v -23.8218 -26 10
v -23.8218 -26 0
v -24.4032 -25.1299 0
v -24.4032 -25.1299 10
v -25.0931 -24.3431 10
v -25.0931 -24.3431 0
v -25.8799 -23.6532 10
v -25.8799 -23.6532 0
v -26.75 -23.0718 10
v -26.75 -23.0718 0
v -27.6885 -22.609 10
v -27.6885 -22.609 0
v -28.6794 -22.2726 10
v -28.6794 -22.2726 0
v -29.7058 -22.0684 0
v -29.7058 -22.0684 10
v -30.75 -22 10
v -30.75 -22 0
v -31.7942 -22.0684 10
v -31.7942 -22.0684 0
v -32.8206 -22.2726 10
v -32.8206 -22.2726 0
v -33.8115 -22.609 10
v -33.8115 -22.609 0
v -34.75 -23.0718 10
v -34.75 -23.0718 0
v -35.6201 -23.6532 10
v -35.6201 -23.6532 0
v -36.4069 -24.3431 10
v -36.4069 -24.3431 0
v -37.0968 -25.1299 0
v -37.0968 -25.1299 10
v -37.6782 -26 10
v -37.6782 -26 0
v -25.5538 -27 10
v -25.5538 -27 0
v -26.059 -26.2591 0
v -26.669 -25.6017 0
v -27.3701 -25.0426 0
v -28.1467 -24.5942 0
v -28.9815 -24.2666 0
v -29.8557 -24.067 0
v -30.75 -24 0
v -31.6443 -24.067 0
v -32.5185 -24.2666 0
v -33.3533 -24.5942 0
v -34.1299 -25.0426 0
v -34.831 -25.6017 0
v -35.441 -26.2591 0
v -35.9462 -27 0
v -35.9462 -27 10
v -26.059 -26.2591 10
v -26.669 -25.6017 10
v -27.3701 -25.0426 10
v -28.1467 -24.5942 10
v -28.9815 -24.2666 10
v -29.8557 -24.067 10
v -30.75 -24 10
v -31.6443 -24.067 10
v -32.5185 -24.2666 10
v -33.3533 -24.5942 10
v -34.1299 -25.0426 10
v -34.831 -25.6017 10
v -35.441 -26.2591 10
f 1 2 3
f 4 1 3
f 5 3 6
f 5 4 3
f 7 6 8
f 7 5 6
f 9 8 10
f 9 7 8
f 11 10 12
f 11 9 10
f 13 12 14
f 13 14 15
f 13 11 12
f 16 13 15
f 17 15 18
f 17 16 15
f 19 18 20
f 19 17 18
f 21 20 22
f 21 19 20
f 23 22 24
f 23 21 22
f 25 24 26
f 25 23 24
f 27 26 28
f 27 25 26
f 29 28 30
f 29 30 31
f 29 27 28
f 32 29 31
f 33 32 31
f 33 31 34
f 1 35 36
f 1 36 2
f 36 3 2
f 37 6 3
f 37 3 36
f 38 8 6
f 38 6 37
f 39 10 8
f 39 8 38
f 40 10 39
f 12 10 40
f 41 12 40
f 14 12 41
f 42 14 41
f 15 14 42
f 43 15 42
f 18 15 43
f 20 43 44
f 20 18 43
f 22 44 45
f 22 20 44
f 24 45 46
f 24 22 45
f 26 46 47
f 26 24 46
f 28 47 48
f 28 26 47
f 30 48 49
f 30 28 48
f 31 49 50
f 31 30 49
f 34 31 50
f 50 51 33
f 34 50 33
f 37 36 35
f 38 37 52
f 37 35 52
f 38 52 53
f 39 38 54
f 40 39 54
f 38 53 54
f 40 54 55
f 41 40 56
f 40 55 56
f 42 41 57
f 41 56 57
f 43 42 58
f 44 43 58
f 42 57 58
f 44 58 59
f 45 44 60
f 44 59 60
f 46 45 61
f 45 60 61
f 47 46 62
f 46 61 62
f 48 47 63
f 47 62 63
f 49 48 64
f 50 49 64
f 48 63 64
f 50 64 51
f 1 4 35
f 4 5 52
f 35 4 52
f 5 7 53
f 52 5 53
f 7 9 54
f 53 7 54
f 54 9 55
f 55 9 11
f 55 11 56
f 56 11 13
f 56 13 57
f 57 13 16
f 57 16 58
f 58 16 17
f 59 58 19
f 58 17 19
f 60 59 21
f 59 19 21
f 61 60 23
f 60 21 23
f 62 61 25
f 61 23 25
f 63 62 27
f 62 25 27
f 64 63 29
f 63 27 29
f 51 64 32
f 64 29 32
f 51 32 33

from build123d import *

# Parameters (mm, degrees)
CYLINDER020_W               = 6
CYLINDER020_H               = 10
CYLINDER020_ANGLE           = 120
CYLINDER020_PLACEMENT_ANGLE = 30
CYLINDER015_W               = 8
CYLINDER015_H               = 10
CYLINDER015_ANGLE           = 120
CYLINDER015_PLACEMENT_ANGLE = 30


with BuildPart() as cilindro011:
    # Cylinder020 → Cylinder020 (revolve)
    with BuildSketch(Plane.XZ):
        with Locations((3, 5)):
            Rectangle(CYLINDER020_W, CYLINDER020_H)
    revolve(axis=Axis((0, 0, 0), (0, 0, 1)), revolution_arc=CYLINDER020_ANGLE)


with BuildPart() as cilindro011_1:
    # Cylinder020 placement: moved
    add(cilindro011.part.moved(Location((-30.75, -30, 0))).rotate(Axis((-30.75, -30, 0), (0, 0, 1)), CYLINDER020_PLACEMENT_ANGLE))


with BuildPart() as inalambrico_medio001:
    # Cylinder015 → Cylinder015 (revolve)
    with BuildSketch(Plane.XZ):
        with Locations((4, 5)):
            Rectangle(CYLINDER015_W, CYLINDER015_H)
    revolve(axis=Axis((0, 0, 0), (0, 0, 1)), revolution_arc=CYLINDER015_ANGLE)


with BuildPart() as inalambrico_medio001_1:
    # Cylinder015 placement: moved
    add(inalambrico_medio001.part.moved(Location((-30.75, -30, 0))).rotate(Axis((-30.75, -30, 0), (0, 0, 1)), CYLINDER015_PLACEMENT_ANGLE))

    # Cut005: cut Cilindro011
    add(cilindro011_1.part, mode=Mode.SUBTRACT)


solid = inalambrico_medio001_1.part
